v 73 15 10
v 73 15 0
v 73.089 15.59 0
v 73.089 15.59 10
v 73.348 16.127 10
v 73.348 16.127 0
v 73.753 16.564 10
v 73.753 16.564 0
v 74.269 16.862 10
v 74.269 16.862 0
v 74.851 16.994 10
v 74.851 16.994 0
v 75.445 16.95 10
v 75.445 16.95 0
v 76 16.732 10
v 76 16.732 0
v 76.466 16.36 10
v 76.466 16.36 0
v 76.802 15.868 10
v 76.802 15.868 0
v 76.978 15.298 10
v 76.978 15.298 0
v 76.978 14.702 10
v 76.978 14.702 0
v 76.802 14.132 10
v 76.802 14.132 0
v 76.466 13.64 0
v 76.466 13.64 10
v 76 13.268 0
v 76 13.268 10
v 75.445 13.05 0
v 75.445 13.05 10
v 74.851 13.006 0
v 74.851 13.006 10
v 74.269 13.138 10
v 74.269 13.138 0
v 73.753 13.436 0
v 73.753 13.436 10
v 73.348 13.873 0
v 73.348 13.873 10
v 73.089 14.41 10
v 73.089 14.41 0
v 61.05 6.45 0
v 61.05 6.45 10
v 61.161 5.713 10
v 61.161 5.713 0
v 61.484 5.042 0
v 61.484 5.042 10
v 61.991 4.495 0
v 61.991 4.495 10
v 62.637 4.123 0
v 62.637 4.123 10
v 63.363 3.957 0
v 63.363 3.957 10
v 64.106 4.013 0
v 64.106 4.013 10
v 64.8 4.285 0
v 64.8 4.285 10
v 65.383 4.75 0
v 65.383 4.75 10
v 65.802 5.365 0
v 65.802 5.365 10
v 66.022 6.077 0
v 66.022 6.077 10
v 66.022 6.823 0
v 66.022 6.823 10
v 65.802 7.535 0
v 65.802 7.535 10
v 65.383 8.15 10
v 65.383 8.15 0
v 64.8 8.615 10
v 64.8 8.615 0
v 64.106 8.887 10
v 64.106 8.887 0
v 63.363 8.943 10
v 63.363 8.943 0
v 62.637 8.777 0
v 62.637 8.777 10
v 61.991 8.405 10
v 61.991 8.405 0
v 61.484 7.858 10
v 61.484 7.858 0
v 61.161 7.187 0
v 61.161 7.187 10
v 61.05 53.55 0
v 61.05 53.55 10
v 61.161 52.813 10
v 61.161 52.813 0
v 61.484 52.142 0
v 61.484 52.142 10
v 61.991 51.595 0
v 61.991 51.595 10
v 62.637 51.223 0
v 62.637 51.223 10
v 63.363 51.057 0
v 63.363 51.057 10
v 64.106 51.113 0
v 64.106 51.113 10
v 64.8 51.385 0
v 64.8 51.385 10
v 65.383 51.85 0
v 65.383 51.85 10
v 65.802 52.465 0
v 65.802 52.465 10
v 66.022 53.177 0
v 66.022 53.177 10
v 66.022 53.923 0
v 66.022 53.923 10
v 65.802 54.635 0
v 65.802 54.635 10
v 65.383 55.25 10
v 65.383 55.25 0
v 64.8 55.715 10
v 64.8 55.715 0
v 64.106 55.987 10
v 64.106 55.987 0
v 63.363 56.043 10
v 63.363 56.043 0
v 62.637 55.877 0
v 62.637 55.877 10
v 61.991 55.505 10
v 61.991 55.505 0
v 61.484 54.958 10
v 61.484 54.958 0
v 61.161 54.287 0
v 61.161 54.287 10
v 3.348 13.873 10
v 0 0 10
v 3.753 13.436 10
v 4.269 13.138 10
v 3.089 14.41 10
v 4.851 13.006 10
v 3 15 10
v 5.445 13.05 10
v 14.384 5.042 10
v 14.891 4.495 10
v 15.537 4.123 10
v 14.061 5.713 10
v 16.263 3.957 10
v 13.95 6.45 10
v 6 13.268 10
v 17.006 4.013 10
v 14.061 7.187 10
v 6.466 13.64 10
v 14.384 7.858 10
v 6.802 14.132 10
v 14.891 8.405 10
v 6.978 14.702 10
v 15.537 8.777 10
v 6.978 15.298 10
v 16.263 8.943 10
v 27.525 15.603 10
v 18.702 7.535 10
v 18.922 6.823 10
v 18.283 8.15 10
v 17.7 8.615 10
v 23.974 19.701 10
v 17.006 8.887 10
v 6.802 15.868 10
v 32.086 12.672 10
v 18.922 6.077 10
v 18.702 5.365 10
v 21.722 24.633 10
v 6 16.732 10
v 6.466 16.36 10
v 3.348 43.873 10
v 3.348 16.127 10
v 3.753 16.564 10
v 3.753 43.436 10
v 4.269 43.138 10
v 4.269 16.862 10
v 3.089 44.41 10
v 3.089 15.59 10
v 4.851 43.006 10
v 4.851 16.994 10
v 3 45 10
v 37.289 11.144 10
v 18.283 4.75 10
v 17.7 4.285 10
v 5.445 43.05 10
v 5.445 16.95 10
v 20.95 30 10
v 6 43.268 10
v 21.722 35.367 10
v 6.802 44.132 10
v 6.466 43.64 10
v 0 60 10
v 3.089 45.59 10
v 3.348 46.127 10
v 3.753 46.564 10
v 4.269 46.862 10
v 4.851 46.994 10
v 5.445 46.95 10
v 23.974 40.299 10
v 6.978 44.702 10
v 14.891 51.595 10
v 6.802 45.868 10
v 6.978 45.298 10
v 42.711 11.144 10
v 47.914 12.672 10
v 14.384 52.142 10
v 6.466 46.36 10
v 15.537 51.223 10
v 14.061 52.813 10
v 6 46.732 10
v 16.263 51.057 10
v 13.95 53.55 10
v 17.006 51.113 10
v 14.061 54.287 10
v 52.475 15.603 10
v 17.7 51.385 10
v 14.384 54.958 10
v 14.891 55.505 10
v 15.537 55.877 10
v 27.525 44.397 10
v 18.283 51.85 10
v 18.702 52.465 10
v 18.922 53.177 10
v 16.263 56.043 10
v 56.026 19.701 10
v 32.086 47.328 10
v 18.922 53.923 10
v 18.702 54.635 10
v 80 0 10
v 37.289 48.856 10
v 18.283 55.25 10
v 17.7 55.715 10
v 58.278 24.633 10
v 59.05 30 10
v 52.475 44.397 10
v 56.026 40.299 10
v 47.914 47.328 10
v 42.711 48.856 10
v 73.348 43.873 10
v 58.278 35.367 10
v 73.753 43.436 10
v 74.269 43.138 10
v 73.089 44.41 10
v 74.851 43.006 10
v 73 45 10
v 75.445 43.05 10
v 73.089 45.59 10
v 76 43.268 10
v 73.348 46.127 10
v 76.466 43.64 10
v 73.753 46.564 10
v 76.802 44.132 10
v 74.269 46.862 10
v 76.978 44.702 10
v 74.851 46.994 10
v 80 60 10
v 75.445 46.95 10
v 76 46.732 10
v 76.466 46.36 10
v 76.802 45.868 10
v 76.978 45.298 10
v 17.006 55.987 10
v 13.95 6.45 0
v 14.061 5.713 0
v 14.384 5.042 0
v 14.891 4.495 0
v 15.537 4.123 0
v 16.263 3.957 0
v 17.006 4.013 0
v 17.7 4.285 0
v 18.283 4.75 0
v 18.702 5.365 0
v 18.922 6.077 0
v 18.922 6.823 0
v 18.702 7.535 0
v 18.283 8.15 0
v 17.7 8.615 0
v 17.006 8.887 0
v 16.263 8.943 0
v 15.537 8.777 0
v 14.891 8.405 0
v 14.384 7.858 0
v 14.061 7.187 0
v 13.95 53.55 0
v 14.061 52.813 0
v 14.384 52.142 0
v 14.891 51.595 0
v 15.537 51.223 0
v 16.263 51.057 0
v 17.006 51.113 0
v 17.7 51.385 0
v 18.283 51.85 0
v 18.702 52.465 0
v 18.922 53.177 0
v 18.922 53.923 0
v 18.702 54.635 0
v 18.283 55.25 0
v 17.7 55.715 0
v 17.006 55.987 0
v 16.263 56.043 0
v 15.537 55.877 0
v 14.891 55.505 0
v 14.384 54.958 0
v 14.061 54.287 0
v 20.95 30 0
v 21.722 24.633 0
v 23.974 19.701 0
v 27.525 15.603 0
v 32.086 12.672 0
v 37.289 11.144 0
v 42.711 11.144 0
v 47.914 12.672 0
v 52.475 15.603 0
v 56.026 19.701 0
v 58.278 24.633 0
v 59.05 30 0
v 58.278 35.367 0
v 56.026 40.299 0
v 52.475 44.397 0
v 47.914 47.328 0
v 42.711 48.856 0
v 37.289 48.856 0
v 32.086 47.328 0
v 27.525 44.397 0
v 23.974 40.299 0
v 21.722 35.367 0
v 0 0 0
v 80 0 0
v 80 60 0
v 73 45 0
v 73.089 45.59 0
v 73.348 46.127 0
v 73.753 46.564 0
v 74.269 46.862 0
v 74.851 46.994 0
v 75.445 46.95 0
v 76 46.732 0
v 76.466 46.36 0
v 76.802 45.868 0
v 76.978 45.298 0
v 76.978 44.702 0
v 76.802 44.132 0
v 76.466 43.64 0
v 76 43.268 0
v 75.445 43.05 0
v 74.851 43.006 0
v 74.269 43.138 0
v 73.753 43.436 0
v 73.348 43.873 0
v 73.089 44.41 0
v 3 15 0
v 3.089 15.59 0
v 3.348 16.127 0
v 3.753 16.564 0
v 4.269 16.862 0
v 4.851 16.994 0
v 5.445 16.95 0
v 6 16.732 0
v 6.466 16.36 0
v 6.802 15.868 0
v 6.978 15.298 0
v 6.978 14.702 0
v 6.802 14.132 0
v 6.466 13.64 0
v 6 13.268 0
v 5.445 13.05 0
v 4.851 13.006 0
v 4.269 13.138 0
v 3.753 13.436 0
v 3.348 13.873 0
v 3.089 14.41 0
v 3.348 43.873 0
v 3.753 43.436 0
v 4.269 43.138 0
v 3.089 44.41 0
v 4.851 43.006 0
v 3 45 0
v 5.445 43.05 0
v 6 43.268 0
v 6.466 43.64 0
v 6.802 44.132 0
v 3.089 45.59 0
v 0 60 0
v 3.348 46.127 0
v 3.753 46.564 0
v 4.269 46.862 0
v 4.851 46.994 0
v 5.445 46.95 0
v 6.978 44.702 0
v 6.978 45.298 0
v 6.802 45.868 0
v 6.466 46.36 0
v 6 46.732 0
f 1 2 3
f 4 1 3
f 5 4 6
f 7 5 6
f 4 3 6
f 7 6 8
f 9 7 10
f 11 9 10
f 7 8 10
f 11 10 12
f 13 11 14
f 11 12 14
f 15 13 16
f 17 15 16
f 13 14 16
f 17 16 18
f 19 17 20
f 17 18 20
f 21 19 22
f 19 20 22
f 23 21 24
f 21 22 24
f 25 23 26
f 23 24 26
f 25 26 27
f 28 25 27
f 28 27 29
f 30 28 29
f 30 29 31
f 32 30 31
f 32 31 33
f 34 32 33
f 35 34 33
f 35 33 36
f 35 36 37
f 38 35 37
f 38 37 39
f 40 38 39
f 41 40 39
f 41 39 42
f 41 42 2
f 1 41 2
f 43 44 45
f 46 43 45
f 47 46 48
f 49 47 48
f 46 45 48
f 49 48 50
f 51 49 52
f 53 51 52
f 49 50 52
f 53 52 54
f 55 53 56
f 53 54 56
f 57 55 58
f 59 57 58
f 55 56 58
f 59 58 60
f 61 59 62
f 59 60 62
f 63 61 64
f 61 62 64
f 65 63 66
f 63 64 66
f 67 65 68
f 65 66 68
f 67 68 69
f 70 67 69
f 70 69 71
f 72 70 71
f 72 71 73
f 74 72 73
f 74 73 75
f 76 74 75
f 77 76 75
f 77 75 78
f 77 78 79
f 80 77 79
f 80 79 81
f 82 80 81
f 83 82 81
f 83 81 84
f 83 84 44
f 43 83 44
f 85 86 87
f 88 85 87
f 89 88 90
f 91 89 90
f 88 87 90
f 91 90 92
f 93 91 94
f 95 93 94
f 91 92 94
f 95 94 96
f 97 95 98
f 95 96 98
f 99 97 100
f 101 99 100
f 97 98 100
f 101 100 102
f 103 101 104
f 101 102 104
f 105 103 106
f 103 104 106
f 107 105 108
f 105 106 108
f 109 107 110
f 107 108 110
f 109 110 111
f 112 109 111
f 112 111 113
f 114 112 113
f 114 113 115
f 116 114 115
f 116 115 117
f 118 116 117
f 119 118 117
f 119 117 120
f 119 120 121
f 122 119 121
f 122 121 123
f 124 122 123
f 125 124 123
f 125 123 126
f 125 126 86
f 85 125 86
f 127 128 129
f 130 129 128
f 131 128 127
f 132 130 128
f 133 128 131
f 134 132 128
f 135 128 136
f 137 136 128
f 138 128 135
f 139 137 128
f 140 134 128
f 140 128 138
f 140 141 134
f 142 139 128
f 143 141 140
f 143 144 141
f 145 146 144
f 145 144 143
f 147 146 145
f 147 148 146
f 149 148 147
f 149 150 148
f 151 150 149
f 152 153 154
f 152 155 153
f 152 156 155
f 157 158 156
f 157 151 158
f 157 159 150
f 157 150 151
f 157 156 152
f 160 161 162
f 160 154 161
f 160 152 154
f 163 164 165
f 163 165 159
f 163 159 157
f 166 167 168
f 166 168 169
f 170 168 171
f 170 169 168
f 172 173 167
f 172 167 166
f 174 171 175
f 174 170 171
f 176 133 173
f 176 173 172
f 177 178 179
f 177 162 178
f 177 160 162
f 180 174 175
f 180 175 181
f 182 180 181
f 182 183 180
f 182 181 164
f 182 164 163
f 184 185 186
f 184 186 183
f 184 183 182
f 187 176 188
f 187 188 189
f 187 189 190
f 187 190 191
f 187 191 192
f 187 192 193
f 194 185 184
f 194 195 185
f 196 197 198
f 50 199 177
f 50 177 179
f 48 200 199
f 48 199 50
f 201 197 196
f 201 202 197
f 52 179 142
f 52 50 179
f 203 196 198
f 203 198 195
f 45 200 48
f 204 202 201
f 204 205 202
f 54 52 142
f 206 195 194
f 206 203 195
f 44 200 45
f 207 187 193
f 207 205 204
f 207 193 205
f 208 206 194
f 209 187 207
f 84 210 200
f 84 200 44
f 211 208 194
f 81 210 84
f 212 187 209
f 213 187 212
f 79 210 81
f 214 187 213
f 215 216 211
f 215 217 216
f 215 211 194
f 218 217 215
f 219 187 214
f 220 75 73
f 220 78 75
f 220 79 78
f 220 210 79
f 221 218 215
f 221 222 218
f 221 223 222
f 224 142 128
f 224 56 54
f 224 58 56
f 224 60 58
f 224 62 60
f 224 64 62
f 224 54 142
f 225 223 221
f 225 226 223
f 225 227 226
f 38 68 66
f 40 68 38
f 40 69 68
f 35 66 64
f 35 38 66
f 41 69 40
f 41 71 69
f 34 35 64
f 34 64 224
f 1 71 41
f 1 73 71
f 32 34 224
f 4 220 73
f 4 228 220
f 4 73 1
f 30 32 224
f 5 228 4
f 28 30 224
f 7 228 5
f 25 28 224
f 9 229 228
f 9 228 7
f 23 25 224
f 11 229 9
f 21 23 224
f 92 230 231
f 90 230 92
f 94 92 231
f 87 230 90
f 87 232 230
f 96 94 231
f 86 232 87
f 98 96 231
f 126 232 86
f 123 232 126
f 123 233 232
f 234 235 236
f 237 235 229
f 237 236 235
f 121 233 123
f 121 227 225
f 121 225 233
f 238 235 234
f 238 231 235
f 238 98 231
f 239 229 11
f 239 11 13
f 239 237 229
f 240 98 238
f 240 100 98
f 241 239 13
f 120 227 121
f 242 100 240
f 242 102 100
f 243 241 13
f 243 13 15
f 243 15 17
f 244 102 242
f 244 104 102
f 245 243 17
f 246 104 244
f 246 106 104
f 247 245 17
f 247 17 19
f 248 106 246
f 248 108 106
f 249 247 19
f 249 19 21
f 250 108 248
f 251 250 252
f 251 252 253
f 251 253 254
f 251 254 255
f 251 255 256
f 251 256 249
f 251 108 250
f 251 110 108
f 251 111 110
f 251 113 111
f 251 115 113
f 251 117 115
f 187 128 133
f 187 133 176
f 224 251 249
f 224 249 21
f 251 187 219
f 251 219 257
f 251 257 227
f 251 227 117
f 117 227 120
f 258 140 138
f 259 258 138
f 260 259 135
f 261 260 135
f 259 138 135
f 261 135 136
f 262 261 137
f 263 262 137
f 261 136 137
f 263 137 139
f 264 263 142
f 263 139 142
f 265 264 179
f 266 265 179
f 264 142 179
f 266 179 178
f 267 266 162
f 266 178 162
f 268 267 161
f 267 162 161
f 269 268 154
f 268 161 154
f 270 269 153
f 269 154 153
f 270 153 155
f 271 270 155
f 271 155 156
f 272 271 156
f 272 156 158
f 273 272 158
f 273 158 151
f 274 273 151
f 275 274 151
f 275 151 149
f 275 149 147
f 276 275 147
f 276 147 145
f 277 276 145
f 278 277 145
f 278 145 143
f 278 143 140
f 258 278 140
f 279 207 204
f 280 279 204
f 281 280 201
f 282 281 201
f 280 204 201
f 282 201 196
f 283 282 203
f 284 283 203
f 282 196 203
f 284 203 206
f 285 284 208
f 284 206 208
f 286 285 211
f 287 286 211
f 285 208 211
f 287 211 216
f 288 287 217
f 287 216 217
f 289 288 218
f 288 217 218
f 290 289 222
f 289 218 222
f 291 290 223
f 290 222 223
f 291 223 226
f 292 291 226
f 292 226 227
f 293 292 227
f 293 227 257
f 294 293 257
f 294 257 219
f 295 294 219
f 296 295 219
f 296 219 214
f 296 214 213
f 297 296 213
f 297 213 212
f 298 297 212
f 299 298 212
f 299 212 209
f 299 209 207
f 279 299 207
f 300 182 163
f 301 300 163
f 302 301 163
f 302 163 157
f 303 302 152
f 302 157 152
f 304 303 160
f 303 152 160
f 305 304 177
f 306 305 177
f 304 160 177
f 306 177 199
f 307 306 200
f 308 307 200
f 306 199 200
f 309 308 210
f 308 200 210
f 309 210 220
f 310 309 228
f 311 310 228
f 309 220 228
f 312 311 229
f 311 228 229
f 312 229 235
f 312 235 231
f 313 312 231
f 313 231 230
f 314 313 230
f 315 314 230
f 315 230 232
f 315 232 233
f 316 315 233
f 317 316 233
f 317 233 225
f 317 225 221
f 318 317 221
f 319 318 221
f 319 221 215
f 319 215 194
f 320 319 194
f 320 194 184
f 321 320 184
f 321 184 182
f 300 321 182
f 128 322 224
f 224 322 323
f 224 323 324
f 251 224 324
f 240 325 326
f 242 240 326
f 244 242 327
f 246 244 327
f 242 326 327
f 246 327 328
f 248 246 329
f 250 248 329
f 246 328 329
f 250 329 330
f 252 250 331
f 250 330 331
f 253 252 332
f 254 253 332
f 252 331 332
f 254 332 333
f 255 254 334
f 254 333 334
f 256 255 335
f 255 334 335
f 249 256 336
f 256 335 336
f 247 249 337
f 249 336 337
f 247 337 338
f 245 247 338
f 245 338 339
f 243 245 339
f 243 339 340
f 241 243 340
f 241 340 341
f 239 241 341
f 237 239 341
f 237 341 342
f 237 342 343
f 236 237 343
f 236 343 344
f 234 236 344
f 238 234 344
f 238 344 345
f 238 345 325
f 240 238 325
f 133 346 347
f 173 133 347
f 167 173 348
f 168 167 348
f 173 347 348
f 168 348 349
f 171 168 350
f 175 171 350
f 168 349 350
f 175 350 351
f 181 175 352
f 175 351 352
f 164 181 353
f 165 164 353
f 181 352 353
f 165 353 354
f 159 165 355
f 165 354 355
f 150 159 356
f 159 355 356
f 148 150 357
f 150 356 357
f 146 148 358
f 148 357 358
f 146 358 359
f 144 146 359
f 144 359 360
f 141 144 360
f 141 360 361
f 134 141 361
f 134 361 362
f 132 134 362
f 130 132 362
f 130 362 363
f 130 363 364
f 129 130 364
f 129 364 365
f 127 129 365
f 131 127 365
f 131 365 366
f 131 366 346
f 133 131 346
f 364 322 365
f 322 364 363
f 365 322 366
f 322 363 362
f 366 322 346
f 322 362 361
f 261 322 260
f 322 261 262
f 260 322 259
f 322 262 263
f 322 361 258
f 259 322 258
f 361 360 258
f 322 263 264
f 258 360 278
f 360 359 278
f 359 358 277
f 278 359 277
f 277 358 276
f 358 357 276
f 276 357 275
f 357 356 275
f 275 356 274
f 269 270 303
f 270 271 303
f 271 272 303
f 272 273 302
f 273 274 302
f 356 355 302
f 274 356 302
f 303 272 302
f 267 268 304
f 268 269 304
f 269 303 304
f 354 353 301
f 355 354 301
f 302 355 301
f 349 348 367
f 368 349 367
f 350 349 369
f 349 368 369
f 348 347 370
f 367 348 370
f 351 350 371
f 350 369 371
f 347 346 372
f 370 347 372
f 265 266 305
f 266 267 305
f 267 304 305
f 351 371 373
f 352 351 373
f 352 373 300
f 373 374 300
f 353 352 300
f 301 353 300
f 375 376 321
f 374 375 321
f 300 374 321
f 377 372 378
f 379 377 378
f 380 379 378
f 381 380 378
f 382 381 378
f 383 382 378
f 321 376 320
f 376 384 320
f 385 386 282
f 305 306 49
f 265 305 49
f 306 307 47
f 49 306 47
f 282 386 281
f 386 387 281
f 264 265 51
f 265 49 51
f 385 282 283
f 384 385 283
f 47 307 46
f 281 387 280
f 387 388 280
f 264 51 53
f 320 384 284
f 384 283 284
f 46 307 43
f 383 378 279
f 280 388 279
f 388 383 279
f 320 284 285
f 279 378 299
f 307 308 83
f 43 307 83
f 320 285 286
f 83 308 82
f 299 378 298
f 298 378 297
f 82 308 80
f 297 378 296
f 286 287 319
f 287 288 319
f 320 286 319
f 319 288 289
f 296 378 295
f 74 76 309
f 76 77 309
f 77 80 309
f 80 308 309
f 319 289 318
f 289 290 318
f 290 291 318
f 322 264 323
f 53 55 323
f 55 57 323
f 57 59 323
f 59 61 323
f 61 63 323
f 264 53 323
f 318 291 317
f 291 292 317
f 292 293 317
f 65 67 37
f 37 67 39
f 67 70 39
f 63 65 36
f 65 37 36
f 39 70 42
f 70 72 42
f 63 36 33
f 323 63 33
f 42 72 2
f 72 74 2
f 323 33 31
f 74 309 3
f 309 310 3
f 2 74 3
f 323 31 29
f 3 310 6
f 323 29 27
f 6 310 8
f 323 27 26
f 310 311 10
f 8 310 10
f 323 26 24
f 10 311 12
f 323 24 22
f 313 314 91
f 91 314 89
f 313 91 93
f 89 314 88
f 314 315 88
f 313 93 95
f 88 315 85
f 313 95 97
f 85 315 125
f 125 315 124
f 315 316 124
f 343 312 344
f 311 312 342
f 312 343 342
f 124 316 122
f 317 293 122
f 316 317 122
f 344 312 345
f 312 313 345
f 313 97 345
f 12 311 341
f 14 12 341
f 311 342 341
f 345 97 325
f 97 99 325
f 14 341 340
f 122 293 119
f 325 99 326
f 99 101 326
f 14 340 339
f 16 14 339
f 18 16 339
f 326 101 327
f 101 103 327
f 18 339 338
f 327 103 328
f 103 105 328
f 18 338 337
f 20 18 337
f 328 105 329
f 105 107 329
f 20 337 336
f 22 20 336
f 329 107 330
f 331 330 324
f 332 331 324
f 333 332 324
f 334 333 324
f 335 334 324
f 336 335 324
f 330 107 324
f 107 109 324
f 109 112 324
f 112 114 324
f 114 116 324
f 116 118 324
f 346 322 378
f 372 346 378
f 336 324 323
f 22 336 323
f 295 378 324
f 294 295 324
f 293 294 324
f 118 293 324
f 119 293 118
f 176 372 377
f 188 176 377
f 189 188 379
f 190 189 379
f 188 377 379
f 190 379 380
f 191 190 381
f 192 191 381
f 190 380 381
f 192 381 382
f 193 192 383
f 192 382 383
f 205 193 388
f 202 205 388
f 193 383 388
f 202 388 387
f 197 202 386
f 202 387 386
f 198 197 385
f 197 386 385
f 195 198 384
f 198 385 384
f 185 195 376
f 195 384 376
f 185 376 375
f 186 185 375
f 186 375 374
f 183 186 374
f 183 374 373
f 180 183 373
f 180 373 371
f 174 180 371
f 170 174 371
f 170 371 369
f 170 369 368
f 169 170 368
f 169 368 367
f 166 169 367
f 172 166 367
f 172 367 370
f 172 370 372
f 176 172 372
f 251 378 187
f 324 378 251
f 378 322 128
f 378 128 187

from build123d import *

# Parameters (mm, degrees)
F0_W     = 80
F0_H     = 60
F1_DEPTH = 10
F3_D     = 38.1
F5_D     = 5
F7_D     = 4


with BuildPart() as f1:
    # F0 (on Top) → F1 (new body)
    with BuildSketch(Plane.XY):
        with Locations((40, 30)):
            Rectangle(F0_W, F0_H)
    extrude(amount=F1_DEPTH)

    # F3 (through all)
    with Locations(Plane(origin=(0, 0, 0), x_dir=(1, 0, 0), z_dir=(0, 0, -1))):
        with Locations((40, -30)):
            Hole(F3_D / 2)

    # F5 (through all)
    with Locations(Plane(origin=(0, 0, 0), x_dir=(1, 0, 0), z_dir=(0, 0, -1))):
        with Locations((16.45, -6.45), (63.55, -6.45), (63.55, -53.55), (16.45, -53.55)):
            Hole(F5_D / 2)

    # F7 (through all)
    with Locations(Plane.XY.offset(10)):
        with Locations((5, 45), (75, 45), (75, 15), (5, 15)):
            Hole(F7_D / 2)


solid = f1.part
